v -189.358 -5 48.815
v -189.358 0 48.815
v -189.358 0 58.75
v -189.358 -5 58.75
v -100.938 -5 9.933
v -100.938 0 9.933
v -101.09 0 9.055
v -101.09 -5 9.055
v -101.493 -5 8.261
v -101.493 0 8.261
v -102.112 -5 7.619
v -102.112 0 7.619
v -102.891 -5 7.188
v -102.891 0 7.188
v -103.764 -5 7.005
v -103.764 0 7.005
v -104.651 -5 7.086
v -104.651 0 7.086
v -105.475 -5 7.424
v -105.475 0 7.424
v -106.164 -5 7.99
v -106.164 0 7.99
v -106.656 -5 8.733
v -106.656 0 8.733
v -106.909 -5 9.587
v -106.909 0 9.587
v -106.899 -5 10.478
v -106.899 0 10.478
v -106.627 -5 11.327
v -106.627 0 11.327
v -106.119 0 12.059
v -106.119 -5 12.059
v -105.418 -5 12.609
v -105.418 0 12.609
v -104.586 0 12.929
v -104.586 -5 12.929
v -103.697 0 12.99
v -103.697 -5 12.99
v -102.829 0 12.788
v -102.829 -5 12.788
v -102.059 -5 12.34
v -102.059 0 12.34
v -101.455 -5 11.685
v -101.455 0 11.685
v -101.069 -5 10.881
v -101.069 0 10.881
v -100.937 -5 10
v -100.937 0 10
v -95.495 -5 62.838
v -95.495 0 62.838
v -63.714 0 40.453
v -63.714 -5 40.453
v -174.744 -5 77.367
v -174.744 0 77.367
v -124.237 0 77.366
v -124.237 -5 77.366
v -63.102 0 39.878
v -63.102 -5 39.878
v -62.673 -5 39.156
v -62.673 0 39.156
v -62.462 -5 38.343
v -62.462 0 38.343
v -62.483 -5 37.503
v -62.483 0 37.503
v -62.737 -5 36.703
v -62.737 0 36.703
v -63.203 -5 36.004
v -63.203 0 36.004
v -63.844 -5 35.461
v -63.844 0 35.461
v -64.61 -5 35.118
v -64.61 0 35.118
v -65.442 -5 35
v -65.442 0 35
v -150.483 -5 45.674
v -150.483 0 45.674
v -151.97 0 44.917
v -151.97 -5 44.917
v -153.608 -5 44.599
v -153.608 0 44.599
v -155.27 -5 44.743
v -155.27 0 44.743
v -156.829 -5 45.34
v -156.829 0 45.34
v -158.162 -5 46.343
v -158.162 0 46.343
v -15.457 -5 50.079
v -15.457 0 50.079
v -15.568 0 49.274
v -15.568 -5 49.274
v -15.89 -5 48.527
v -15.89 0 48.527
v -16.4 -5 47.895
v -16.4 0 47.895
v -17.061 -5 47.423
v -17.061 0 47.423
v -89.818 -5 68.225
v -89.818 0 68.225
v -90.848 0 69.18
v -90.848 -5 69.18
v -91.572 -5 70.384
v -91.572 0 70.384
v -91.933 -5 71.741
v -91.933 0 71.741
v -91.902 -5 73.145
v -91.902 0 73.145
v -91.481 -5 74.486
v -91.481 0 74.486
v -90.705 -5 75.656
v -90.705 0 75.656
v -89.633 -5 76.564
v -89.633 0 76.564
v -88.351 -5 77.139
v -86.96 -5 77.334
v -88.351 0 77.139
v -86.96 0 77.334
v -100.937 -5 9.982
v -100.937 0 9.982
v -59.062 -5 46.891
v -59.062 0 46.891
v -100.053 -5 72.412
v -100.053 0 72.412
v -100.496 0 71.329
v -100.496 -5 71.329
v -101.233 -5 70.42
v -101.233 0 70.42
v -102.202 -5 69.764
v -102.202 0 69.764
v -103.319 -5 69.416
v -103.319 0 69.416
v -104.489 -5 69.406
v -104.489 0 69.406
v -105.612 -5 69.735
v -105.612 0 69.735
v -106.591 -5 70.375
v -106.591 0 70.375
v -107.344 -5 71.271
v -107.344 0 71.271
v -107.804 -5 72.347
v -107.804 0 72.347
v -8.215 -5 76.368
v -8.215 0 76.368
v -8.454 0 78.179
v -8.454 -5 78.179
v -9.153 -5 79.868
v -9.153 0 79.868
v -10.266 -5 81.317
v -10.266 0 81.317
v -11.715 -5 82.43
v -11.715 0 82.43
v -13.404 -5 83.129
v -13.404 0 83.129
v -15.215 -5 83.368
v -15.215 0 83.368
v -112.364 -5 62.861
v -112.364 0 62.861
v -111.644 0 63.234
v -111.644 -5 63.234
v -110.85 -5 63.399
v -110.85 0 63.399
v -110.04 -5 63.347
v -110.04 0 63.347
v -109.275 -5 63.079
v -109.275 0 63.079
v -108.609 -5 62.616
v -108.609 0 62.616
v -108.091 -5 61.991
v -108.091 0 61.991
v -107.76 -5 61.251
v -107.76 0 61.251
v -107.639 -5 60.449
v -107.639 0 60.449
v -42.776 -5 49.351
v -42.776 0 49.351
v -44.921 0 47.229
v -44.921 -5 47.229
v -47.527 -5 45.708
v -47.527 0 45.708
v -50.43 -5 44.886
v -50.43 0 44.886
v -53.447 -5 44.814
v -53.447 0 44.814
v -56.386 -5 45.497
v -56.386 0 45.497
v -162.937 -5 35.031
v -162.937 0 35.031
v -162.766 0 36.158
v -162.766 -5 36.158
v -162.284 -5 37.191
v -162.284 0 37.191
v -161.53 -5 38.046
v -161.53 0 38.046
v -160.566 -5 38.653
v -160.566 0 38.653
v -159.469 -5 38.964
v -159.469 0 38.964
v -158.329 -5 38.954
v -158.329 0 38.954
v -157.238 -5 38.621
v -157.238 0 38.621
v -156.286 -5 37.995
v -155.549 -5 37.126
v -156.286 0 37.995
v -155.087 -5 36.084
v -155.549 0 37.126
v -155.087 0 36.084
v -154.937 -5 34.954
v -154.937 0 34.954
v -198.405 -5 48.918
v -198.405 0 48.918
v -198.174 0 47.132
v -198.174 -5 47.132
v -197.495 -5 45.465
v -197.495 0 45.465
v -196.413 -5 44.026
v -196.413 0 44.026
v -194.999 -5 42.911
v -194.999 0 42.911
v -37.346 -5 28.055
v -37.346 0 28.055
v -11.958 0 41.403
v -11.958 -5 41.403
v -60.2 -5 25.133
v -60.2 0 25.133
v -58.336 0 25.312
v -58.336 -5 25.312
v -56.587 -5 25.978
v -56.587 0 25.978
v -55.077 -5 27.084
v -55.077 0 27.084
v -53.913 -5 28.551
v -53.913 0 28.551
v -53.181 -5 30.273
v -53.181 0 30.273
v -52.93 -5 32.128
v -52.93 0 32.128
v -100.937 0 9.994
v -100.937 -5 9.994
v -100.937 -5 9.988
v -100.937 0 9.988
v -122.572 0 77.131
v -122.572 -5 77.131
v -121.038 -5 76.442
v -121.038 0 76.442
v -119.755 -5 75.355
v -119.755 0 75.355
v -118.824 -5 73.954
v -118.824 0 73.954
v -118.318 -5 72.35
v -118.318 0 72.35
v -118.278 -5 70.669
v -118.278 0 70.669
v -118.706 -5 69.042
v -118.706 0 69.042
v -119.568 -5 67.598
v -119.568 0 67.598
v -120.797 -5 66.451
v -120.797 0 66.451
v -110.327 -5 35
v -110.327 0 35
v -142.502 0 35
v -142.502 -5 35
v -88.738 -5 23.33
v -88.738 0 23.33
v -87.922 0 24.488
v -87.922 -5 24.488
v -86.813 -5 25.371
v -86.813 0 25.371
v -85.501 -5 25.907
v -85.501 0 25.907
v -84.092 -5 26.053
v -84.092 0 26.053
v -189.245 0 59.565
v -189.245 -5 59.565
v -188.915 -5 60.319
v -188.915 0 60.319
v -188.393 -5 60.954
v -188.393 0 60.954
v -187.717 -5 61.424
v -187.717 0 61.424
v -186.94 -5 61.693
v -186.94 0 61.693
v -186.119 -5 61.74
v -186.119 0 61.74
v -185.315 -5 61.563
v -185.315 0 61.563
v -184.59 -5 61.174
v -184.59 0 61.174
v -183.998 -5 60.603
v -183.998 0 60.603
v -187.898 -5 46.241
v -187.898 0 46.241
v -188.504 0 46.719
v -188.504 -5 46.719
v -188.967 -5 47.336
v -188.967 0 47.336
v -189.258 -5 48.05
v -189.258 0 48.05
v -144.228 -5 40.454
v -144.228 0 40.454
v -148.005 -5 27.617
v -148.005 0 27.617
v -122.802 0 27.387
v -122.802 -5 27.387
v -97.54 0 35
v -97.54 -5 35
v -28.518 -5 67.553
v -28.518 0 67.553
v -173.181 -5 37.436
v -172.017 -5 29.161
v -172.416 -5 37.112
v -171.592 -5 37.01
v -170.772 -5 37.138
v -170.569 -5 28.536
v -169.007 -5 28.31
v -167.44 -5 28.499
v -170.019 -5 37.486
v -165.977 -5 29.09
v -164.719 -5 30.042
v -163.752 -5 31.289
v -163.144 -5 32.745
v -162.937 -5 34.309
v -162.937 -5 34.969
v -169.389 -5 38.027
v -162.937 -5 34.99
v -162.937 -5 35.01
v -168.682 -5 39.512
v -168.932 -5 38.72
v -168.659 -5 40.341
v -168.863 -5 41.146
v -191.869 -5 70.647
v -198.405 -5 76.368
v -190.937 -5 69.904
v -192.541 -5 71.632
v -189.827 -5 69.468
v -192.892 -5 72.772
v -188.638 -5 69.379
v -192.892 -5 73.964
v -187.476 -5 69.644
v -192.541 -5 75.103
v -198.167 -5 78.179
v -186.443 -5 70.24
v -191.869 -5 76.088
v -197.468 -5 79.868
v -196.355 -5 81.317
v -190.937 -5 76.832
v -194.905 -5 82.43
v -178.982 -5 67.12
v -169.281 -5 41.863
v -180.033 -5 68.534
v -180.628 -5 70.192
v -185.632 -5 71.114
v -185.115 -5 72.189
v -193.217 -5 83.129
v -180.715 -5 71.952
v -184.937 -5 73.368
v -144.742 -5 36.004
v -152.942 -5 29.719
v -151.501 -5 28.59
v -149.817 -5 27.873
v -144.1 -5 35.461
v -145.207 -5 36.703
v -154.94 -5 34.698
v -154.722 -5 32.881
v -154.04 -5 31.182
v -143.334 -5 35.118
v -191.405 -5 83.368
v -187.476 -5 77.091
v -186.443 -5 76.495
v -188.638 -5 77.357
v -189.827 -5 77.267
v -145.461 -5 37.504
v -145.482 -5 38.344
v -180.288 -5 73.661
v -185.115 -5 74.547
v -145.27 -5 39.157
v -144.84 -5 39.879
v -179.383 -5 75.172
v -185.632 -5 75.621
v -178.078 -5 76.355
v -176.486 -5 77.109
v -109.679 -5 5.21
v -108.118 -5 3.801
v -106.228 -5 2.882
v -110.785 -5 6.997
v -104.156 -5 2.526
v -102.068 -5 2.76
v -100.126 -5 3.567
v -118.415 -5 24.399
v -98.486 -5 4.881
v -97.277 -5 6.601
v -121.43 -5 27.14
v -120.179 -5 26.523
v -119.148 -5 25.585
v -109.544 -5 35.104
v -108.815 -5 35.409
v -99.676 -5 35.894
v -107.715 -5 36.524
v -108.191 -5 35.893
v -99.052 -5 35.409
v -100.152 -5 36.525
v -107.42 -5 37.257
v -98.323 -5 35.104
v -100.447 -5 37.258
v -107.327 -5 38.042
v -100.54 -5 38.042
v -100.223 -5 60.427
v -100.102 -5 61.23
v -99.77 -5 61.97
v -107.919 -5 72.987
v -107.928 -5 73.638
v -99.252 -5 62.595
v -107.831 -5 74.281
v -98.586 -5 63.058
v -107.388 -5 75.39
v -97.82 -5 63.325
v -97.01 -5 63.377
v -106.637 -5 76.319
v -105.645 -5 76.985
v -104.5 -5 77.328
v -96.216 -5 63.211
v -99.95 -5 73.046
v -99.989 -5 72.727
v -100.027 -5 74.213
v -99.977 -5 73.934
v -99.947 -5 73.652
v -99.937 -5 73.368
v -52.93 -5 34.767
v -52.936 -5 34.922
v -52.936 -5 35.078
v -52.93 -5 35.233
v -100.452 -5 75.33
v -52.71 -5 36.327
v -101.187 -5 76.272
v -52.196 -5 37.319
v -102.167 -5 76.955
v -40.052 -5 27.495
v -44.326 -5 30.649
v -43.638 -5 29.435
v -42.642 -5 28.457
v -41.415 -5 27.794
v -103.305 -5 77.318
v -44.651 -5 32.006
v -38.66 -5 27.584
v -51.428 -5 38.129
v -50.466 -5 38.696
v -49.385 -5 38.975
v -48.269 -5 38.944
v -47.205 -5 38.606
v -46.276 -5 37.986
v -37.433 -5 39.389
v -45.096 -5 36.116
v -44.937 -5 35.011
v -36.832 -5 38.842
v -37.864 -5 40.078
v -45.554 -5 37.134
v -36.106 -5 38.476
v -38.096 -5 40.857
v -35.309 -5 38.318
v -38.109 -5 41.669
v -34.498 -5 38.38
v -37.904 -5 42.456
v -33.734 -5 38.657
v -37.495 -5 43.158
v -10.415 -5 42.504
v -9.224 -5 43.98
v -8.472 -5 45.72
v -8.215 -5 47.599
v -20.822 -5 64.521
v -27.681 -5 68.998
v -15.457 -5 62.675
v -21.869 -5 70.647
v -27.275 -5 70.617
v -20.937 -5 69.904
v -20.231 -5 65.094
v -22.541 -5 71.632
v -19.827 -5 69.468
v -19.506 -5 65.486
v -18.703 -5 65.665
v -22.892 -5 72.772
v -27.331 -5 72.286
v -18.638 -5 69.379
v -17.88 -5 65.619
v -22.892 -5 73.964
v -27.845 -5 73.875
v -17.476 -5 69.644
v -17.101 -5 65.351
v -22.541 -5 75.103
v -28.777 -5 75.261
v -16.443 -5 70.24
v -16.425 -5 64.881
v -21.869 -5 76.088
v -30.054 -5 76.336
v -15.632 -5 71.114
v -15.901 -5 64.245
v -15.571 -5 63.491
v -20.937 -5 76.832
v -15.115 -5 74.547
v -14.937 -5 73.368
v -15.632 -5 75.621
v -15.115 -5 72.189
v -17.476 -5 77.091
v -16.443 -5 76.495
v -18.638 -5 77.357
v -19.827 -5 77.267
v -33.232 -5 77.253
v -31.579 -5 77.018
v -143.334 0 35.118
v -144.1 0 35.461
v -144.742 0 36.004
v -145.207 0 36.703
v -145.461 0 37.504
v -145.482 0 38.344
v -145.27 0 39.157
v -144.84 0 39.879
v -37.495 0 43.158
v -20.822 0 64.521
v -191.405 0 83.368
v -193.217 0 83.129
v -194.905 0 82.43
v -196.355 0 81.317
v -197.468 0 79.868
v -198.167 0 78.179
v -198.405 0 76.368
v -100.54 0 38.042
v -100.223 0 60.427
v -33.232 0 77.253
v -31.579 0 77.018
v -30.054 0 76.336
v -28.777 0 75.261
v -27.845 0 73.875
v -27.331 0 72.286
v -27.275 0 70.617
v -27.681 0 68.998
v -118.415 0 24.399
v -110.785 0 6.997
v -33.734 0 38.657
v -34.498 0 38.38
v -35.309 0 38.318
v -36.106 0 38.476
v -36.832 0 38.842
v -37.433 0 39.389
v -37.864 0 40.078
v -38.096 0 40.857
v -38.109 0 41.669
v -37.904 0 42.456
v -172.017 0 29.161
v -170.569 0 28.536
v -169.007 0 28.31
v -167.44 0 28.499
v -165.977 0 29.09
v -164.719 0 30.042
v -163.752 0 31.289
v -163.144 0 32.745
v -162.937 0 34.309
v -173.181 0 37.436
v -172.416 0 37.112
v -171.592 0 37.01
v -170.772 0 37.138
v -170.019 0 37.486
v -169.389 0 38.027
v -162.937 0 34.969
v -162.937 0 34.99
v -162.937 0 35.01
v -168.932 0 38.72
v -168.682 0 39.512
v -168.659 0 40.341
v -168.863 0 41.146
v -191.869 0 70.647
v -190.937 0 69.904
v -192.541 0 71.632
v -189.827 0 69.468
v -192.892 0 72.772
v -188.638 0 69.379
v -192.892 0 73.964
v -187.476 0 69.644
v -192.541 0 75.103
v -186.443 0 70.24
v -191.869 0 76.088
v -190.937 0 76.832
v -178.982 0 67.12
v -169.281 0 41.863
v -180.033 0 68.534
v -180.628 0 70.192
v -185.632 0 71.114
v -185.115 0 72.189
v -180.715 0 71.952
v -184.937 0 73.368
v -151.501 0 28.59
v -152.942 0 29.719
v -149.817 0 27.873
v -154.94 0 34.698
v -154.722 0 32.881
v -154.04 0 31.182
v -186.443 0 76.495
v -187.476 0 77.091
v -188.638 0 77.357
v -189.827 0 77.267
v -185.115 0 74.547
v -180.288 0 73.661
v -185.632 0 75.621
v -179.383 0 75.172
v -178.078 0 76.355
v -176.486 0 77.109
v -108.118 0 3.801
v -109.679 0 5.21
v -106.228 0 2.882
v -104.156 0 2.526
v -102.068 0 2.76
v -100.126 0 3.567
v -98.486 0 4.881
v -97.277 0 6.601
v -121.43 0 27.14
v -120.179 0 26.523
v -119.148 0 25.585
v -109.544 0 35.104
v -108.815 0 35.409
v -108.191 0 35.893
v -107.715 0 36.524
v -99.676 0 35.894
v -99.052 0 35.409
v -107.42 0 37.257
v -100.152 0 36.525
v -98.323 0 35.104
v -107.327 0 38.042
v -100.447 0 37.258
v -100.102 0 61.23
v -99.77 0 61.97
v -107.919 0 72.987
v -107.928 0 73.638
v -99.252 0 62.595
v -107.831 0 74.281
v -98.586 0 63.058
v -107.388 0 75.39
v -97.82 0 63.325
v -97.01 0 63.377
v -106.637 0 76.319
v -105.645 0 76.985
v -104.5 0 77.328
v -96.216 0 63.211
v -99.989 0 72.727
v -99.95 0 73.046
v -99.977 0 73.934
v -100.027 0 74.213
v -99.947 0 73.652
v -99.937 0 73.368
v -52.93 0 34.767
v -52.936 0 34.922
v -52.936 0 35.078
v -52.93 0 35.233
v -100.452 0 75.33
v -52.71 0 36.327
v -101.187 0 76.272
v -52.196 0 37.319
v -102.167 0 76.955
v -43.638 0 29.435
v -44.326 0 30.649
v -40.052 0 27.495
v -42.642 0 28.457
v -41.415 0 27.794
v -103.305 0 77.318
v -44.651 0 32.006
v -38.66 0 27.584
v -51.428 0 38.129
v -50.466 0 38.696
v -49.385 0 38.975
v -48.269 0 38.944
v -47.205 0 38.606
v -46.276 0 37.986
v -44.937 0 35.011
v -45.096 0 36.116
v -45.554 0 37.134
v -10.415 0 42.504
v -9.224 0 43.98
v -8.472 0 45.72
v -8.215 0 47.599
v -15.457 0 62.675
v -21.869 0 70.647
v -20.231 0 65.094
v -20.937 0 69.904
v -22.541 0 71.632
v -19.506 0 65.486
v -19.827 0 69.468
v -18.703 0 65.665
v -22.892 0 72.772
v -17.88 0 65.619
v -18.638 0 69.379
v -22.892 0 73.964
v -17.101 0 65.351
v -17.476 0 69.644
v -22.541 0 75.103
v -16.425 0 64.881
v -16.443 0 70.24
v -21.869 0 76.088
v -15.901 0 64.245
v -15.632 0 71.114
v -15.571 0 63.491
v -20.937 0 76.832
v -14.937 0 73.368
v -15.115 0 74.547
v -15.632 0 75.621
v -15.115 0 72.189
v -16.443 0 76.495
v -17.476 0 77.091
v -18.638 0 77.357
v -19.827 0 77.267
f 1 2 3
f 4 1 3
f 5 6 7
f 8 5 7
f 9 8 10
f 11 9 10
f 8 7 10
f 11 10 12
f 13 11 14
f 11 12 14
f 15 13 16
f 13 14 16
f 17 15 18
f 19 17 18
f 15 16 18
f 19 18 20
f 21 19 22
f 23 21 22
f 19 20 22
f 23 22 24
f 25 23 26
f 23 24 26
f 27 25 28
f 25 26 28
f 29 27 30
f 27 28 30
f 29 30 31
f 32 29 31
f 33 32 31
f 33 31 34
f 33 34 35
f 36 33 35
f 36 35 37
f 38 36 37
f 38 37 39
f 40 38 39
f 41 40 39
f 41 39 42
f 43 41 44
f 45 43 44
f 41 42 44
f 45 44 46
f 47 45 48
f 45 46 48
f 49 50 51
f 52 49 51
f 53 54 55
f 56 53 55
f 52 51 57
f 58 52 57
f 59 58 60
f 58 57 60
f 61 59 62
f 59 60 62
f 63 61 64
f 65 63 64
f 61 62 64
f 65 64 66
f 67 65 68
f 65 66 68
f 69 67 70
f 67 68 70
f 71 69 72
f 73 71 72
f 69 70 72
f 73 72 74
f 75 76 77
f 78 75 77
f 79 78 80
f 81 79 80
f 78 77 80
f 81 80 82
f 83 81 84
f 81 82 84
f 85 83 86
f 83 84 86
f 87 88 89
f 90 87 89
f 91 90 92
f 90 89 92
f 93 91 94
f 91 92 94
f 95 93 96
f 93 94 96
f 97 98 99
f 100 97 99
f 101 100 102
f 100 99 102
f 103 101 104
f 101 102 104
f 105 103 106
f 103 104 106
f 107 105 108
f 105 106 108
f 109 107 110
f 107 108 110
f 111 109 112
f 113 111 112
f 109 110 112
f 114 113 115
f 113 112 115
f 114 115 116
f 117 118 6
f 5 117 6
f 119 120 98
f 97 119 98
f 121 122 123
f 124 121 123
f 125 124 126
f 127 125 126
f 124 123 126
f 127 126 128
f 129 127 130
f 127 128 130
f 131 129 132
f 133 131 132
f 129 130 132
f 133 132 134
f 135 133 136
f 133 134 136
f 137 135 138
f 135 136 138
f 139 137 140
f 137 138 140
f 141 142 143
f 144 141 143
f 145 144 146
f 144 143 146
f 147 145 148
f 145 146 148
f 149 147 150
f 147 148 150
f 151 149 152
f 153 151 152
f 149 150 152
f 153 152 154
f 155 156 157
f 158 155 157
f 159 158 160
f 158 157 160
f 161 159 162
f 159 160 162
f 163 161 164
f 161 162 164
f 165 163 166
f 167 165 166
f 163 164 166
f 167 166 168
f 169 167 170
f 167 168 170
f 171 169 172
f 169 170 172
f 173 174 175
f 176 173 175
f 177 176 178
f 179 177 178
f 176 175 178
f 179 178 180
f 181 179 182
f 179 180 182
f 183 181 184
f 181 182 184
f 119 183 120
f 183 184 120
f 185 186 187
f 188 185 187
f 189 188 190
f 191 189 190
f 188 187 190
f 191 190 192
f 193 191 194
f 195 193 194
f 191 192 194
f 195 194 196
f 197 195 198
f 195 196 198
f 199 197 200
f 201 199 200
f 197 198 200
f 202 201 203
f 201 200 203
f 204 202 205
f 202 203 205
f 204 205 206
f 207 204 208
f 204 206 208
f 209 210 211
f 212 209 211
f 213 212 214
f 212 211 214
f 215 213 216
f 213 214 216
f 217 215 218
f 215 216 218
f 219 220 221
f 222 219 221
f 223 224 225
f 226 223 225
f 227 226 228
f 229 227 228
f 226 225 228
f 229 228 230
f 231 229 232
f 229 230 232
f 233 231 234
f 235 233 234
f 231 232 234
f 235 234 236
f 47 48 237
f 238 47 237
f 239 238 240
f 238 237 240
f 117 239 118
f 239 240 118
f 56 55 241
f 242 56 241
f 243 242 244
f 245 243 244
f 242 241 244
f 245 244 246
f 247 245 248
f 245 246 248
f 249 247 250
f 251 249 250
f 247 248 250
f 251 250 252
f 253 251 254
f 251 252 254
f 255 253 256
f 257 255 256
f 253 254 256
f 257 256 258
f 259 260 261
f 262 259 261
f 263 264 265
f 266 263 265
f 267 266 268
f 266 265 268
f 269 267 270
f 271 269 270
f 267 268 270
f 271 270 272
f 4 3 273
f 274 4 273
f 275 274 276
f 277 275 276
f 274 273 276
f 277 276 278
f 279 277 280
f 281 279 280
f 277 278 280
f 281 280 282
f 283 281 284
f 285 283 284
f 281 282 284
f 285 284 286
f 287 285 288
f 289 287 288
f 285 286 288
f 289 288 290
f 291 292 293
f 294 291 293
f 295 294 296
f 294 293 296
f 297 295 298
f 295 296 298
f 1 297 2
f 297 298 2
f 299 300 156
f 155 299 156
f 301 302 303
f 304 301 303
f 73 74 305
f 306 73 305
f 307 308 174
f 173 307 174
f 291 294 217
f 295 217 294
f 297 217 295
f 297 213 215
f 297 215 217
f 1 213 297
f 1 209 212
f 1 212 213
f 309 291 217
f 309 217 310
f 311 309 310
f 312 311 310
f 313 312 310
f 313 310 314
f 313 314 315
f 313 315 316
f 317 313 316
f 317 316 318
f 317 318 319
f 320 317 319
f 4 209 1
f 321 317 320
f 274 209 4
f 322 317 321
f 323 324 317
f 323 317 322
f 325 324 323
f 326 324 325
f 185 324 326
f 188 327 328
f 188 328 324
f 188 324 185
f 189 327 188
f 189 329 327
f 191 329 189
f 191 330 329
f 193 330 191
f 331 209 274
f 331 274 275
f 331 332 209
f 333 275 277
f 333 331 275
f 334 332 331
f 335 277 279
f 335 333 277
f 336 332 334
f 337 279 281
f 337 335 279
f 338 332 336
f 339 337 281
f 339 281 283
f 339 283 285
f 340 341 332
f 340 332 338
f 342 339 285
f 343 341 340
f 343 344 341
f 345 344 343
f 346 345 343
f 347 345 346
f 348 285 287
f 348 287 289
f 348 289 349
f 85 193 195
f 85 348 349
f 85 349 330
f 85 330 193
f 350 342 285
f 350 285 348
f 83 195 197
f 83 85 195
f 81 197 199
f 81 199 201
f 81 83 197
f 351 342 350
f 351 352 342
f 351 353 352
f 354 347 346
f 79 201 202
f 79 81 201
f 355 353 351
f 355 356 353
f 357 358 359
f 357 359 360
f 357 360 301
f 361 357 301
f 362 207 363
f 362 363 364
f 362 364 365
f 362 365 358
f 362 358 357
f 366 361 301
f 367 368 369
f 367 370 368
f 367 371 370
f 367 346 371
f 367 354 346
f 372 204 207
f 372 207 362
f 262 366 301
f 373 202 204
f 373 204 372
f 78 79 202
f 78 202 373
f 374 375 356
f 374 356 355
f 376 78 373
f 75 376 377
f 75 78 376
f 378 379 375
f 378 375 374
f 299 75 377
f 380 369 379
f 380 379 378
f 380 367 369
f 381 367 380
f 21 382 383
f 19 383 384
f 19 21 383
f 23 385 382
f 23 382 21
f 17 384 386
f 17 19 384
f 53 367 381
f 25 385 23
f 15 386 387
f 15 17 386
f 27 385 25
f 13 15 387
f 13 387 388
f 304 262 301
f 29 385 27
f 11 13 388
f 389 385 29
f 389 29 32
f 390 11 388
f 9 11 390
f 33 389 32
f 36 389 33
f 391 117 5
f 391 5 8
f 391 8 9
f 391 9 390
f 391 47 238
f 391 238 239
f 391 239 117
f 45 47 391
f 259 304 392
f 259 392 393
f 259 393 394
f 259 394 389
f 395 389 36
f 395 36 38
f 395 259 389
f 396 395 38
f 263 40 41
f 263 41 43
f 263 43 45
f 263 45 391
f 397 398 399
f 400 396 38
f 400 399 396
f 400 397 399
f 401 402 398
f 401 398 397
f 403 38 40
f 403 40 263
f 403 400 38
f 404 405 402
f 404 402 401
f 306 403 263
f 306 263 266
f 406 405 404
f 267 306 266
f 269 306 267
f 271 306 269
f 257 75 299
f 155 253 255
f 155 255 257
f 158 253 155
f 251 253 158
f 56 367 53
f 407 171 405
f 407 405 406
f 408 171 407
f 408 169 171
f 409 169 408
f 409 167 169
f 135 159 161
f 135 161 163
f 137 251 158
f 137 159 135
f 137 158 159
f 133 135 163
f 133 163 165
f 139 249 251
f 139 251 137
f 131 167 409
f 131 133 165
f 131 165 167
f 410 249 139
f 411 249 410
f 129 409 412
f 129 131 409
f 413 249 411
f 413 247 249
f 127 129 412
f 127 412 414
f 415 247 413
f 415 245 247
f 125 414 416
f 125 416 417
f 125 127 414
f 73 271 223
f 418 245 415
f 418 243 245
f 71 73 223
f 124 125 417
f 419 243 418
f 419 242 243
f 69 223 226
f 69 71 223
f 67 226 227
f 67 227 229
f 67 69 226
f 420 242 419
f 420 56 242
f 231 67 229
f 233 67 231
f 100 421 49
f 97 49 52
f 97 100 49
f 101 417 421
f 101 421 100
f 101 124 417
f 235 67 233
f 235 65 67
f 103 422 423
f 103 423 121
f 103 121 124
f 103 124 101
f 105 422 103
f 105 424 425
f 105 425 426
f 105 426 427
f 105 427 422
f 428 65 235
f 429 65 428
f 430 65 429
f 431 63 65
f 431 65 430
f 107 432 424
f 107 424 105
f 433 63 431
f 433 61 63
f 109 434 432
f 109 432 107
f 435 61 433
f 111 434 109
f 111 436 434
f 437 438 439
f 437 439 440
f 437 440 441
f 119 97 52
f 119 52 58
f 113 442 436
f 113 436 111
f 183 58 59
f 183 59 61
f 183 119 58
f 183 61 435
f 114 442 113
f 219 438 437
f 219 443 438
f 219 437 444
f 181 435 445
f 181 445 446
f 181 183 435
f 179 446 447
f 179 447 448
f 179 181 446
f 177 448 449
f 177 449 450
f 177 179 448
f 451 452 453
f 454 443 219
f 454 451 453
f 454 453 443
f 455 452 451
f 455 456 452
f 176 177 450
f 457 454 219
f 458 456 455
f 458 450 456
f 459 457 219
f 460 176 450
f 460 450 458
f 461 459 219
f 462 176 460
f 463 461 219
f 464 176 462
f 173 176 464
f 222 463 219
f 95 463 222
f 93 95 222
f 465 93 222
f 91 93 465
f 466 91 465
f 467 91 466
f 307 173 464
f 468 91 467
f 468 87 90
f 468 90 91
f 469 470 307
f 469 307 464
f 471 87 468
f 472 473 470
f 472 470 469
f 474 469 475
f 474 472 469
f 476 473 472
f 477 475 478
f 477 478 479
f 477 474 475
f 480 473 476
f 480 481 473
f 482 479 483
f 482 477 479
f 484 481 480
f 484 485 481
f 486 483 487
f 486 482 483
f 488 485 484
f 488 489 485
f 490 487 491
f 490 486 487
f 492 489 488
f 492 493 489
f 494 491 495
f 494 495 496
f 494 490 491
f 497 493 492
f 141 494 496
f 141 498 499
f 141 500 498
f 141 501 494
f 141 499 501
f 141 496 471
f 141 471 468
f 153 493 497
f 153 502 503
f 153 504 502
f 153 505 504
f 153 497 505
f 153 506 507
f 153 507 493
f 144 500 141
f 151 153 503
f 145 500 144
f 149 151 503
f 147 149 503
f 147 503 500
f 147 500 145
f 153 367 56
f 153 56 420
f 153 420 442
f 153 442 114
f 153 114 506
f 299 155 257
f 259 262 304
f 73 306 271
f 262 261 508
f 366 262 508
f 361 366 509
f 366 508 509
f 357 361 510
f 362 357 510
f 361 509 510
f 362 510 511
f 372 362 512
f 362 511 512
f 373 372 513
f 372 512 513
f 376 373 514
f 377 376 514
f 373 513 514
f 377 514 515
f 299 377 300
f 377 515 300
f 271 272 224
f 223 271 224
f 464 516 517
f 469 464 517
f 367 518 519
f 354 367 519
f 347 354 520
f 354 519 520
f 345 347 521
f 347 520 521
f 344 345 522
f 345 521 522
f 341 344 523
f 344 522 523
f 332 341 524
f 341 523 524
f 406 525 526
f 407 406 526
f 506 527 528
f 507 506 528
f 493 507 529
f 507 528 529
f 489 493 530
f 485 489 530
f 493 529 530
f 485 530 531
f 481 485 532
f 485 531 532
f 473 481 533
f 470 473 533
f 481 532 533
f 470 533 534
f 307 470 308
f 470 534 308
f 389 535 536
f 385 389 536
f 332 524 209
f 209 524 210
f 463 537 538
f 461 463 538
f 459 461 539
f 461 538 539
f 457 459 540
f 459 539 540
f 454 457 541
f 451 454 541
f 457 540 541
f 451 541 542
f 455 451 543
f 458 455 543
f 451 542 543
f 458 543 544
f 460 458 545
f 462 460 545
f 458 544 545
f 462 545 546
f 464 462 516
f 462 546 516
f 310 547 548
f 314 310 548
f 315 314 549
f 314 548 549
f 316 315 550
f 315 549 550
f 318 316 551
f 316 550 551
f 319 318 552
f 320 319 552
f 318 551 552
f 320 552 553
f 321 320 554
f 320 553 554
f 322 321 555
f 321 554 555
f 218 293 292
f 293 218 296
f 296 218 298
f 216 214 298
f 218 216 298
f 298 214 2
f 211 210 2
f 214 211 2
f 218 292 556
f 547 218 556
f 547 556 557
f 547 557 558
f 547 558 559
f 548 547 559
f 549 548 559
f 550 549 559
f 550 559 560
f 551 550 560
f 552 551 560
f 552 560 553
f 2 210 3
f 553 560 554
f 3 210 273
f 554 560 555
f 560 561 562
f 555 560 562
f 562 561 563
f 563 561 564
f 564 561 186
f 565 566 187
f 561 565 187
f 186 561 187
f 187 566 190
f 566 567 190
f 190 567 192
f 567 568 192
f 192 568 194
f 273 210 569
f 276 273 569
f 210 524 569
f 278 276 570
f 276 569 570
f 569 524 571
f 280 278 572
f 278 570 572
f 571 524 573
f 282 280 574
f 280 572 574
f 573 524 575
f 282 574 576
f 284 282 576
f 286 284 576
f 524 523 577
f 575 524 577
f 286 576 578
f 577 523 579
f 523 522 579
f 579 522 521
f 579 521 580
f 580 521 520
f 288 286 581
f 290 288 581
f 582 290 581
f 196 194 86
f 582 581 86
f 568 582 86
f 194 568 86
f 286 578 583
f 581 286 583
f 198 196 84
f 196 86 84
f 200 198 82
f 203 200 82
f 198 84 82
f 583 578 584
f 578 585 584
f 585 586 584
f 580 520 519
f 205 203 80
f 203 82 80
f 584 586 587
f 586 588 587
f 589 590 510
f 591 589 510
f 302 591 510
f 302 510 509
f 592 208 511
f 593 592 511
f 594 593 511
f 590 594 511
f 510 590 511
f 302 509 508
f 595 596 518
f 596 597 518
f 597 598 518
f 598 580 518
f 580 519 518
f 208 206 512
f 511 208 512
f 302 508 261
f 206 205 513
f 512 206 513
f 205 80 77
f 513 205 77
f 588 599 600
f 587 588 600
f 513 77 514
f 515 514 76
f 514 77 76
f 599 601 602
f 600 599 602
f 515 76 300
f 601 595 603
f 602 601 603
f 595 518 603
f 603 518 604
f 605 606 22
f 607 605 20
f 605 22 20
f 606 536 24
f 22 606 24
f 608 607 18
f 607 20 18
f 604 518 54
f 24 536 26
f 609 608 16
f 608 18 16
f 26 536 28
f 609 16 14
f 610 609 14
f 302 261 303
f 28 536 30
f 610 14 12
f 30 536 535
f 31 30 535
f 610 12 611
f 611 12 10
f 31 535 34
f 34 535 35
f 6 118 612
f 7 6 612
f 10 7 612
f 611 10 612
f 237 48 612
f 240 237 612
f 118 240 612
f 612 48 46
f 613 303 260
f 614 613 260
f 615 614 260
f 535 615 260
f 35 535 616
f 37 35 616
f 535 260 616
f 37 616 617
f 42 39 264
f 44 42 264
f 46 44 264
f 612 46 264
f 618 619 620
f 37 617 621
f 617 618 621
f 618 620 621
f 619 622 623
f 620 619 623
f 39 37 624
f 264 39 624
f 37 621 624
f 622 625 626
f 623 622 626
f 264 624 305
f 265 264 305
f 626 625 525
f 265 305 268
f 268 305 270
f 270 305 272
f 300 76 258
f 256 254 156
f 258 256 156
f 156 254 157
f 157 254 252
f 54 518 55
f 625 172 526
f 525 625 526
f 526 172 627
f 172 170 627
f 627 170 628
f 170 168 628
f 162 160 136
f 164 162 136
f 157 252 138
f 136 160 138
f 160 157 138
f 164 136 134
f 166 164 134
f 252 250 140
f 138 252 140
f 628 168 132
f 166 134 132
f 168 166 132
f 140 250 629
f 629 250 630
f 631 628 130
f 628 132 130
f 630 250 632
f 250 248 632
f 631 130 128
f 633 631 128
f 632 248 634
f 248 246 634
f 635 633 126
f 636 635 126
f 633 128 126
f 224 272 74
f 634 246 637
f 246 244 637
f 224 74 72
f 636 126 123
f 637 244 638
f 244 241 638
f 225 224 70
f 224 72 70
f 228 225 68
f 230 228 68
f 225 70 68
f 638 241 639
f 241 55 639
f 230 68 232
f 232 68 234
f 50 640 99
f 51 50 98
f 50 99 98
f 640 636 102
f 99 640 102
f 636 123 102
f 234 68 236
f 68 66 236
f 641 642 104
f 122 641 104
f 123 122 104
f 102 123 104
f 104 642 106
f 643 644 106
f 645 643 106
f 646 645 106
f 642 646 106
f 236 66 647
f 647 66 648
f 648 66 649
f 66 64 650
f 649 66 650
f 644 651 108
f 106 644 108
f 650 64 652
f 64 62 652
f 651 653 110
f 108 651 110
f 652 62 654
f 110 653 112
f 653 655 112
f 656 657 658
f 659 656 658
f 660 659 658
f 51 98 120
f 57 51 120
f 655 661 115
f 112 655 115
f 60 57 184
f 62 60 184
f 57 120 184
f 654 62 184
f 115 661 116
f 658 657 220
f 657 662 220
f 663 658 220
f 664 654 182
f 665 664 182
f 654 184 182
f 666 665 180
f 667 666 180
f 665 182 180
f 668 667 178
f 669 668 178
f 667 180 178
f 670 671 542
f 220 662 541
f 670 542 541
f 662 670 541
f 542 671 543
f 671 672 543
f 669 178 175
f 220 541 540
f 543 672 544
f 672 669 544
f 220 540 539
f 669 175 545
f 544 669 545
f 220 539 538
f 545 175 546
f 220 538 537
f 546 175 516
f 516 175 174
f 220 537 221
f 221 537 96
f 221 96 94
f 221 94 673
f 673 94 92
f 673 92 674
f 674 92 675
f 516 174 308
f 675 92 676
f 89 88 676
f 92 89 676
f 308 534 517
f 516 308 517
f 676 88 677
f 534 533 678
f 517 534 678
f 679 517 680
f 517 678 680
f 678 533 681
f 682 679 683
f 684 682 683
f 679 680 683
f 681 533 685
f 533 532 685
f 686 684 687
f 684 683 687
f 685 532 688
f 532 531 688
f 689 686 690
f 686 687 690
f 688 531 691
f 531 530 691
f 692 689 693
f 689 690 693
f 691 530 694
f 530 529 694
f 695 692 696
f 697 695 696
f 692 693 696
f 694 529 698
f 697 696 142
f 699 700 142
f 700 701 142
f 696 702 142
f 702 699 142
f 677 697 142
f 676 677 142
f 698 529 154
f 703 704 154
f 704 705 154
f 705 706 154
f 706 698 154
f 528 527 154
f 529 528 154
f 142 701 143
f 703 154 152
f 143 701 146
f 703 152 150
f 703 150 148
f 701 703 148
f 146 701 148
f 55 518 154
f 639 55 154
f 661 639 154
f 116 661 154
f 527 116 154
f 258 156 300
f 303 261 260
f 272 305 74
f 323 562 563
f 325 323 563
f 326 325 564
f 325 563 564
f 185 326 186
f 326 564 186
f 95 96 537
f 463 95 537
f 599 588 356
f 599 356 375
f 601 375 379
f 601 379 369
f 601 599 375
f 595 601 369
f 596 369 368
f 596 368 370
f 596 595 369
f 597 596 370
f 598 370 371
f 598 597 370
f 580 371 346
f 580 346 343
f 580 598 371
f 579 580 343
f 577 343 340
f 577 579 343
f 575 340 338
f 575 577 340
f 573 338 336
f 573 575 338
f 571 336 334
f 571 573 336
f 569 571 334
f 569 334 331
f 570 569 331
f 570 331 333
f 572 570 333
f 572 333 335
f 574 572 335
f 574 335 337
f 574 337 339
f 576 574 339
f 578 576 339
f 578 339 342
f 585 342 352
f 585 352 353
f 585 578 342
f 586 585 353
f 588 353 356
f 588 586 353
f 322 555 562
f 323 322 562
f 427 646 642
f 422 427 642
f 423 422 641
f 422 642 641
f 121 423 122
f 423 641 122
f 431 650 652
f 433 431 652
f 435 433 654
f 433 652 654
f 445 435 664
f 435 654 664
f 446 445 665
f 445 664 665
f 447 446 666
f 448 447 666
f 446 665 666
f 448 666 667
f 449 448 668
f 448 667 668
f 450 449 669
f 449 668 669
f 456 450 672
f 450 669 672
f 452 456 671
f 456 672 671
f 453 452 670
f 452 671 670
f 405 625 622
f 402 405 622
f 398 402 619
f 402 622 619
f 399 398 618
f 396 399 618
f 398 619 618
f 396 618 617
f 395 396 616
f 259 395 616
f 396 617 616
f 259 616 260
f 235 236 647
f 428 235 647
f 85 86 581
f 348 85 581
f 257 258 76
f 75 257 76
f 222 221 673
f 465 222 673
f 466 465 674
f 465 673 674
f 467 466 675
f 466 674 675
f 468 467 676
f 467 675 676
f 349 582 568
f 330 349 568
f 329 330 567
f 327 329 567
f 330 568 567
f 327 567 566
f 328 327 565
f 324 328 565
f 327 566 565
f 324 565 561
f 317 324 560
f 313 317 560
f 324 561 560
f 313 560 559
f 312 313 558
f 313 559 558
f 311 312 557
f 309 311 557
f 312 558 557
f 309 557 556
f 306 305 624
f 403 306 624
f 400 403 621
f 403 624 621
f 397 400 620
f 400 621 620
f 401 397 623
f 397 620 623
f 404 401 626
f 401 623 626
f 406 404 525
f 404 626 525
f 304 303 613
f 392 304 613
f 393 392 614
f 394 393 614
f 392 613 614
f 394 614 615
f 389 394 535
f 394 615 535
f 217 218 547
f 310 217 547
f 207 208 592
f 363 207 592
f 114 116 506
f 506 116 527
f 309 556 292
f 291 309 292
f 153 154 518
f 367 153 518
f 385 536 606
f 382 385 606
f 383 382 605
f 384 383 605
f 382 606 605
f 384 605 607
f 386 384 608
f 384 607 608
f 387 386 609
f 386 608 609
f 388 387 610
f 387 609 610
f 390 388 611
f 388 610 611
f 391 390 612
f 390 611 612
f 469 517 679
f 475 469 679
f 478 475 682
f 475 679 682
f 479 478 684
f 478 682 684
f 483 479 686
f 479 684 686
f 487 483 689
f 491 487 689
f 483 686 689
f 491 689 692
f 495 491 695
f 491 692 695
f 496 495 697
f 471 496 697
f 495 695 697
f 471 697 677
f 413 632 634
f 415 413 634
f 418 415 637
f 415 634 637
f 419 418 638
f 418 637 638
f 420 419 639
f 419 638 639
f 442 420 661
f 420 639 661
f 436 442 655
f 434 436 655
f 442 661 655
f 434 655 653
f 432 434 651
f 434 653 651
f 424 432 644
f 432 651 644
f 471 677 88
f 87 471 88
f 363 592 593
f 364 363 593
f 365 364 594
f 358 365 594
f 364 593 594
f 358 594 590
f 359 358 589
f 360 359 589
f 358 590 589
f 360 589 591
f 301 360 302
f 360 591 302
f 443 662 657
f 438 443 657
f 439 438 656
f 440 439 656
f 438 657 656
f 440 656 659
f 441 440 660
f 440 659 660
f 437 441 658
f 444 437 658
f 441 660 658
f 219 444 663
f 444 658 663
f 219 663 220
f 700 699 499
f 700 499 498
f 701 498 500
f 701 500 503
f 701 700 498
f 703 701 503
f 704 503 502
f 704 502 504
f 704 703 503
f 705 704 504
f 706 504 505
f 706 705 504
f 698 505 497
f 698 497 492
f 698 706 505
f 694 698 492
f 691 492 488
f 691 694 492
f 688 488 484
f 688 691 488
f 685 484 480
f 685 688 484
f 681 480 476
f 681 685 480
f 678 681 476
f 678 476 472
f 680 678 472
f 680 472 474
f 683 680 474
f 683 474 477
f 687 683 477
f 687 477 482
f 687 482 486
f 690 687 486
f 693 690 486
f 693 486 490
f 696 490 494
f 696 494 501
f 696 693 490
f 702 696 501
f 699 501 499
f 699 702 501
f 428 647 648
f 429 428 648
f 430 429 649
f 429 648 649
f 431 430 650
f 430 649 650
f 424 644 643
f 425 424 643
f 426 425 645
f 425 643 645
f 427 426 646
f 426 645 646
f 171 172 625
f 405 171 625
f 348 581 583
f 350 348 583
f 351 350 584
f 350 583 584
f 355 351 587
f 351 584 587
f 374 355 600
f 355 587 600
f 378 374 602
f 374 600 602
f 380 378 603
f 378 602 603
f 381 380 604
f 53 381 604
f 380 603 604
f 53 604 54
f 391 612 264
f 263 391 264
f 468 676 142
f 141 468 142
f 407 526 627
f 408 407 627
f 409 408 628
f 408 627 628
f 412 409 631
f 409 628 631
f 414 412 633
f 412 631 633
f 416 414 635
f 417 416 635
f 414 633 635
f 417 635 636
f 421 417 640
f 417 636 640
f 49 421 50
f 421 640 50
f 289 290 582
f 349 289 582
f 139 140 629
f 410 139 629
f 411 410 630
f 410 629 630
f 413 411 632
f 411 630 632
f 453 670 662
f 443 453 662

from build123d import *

# Parameters (mm, degrees)
F0_R     = 4
F1_DEPTH = 5


with BuildPart() as f1:
    # F0 (on Front) → F1 (new body)
    with BuildSketch(Plane.XZ):
        with BuildLine():
            ThreePointArc((-162.93692, 35.030597), (-158.898512, 38.999814), (-154.937307, 34.953548))
            Line((-154.937307, 34.953548), (-154.940273, 34.69815))
            ThreePointArc((-154.940273, 34.69815), (-152.941566, 29.718719), (-148.004667, 27.617152))
            Line((-148.004667, 27.617152), (-122.802143, 27.387))
            ThreePointArc((-122.802143, 27.387), (-120.179499, 26.522977), (-118.415412, 24.398643))
            Line((-118.415412, 24.398643), (-110.784866, 6.997219))
            ThreePointArc((-110.784866, 6.997219), (-104.156475, 2.525958), (-97.277175, 6.600632))
            Line((-97.277175, 6.600632), (-88.737962, 23.330208))
            ThreePointArc((-88.737962, 23.330208), (-86.812994, 25.370653), (-84.092183, 26.05337))
            Line((-84.092183, 26.05337), (-60.199575, 25.133445))
            ThreePointArc((-60.199575, 25.133445), (-55.076662, 27.084195), (-52.930257, 32.128262))
            Line((-52.930257, 32.128262), (-52.930257, 34.767204))
            ThreePointArc((-52.930257, 34.767204), (-52.937037, 35), (-52.930257, 35.232796))
            ThreePointArc((-52.930257, 35.232796), (-48.82609, 38.998461), (-44.937052, 35.011005))
            Line((-44.937052, 35.011005), (-44.650559, 32.005813))
            ThreePointArc((-44.650559, 32.005813), (-42.052043, 28.082513), (-37.346324, 28.054719))
            Line((-37.346324, 28.054719), (-11.957943, 41.402887))
            ThreePointArc((-11.957943, 41.402887), (-9.223694, 43.979528), (-8.215466, 47.598736))
            Line((-8.215466, 47.598736), (-8.215466, 76.367726))
            ThreePointArc((-8.215466, 76.367726), (-10.265719, 81.317474), (-15.215466, 83.367726))
            Line((-15.215466, 83.367726), (-191.405466, 83.367726))
            ThreePointArc((-191.405466, 83.367726), (-196.355214, 81.317474), (-198.405466, 76.367726))
            Line((-198.405466, 76.367726), (-198.405466, 48.917622))
            ThreePointArc((-198.405466, 48.917622), (-197.494704, 45.464917), (-194.999416, 42.910666))
            Line((-194.999416, 42.910666), (-172.017448, 29.160603))
            ThreePointArc((-172.017448, 29.160603), (-165.977458, 29.090075), (-162.93692, 34.309423))
            Line((-162.93692, 34.309423), (-162.93692, 34.969403))
            ThreePointArc((-162.93692, 34.969403), (-162.937037, 35), (-162.93692, 35.030597))
        make_face()
        with BuildLine():
            ThreePointArc((-100.937777, 9.933366), (-106.936852, 10.033319), (-100.937037, 10))
            ThreePointArc((-100.937037, 10), (-100.937051, 9.990837), (-100.937093, 9.981674))
            Line((-100.937093, 9.981674), (-100.937777, 9.933366))
        make_face(mode=Mode.SUBTRACT)
        with BuildLine():
            ThreePointArc((-189.357673, 58.750004), (-187.33795, 61.585327), (-183.998301, 60.602938))
            Line((-183.998301, 60.602938), (-169.280903, 41.863033))
            ThreePointArc((-169.280903, 41.863033), (-169.389036, 38.027191), (-173.180539, 37.435689))
            Line((-173.180539, 37.435689), (-187.897937, 46.241077))
            ThreePointArc((-187.897937, 46.241077), (-188.967347, 47.335756), (-189.357673, 48.815487))
            Line((-189.357673, 48.815487), (-189.357673, 58.750004))
        make_face(mode=Mode.SUBTRACT)
        with BuildLine():
            Line((-144.227608, 40.453975), (-112.364396, 62.860901))
            ThreePointArc((-112.364396, 62.860901), (-109.274696, 63.078906), (-107.638996, 60.448647))
            Line((-107.638996, 60.448647), (-107.327348, 38.041722))
            ThreePointArc((-107.327348, 38.041722), (-108.191037, 35.893482), (-110.327057, 35))
            Line((-110.327057, 35), (-142.501918, 35))
            ThreePointArc((-142.501918, 35), (-145.362156, 37.094993), (-144.227608, 40.453975))
        make_face(mode=Mode.SUBTRACT)
        with BuildLine():
            Line((-158.161986, 46.343195), (-178.982052, 67.12042))
            ThreePointArc((-178.982052, 67.12042), (-180.288218, 73.660732), (-174.743657, 77.367428))
            Line((-174.743657, 77.367428), (-124.237035, 77.366367))
            ThreePointArc((-124.237035, 77.366367), (-118.514624, 73.169857), (-120.796878, 66.450631))
            Line((-120.796878, 66.450631), (-150.483435, 45.674467))
            ThreePointArc((-150.483435, 45.674467), (-154.444289, 44.612828), (-158.161986, 46.343195))
        make_face(mode=Mode.SUBTRACT)
        with Locations((-188.937037, 73.367726)):
            Circle(F0_R, mode=Mode.SUBTRACT)
        with BuildLine():
            ThreePointArc((-100.027452, 74.213391), (-99.959705, 73.792969), (-99.937037, 73.367726))
            ThreePointArc((-99.937037, 73.367726), (-99.966125, 72.886206), (-100.052968, 72.411689))
            ThreePointArc((-100.052968, 72.411689), (-103.9034, 69.367868), (-107.804478, 72.346502))
            ThreePointArc((-107.804478, 72.346502), (-107.93665, 73.312097), (-107.831384, 74.280995))
            ThreePointArc((-107.831384, 74.280995), (-103.902387, 77.367576), (-100.027452, 74.213391))
        make_face(mode=Mode.SUBTRACT)
        with BuildLine():
            ThreePointArc((-100.222687, 60.427463), (-98.585652, 63.057648), (-95.495448, 62.837655))
            Line((-95.495448, 62.837655), (-63.714392, 40.452673))
            ThreePointArc((-63.714392, 40.452673), (-62.582035, 37.093915), (-65.441931, 35))
            Line((-65.441931, 35), (-97.540001, 35))
            ThreePointArc((-97.540001, 35), (-99.676288, 35.893753), (-100.5397, 38.042481))
            Line((-100.5397, 38.042481), (-100.222687, 60.427463))
        make_face(mode=Mode.SUBTRACT)
        with BuildLine():
            Line((-59.062029, 46.891406), (-89.817697, 68.225334))
            ThreePointArc((-89.817697, 68.225334), (-91.738656, 73.830314), (-86.960347, 77.333691))
            Line((-86.960347, 77.333691), (-33.232048, 77.252552))
            ThreePointArc((-33.232048, 77.252552), (-27.844669, 73.875237), (-28.517809, 67.552501))
            Line((-28.517809, 67.552501), (-42.775908, 49.351358))
            ThreePointArc((-42.775908, 49.351358), (-50.430287, 44.886066), (-59.062029, 46.891406))
        make_face(mode=Mode.SUBTRACT)
        with BuildLine():
            Line((-37.495455, 43.158397), (-20.822425, 64.520861))
            ThreePointArc((-20.822425, 64.520861), (-17.481474, 65.511855), (-15.457471, 62.675056))
            Line((-15.457471, 62.675056), (-15.457471, 50.078587))
            ThreePointArc((-15.457471, 50.078587), (-15.889569, 48.527498), (-17.06139, 47.423223))
            Line((-17.06139, 47.423223), (-33.73442, 38.657229))
            ThreePointArc((-33.73442, 38.657229), (-37.432632, 39.389004), (-37.495455, 43.158397))
        make_face(mode=Mode.SUBTRACT)
        with Locations((-18.937037, 73.367726)):
            Circle(F0_R, mode=Mode.SUBTRACT)
    extrude(amount=F1_DEPTH)


solid = f1.part
